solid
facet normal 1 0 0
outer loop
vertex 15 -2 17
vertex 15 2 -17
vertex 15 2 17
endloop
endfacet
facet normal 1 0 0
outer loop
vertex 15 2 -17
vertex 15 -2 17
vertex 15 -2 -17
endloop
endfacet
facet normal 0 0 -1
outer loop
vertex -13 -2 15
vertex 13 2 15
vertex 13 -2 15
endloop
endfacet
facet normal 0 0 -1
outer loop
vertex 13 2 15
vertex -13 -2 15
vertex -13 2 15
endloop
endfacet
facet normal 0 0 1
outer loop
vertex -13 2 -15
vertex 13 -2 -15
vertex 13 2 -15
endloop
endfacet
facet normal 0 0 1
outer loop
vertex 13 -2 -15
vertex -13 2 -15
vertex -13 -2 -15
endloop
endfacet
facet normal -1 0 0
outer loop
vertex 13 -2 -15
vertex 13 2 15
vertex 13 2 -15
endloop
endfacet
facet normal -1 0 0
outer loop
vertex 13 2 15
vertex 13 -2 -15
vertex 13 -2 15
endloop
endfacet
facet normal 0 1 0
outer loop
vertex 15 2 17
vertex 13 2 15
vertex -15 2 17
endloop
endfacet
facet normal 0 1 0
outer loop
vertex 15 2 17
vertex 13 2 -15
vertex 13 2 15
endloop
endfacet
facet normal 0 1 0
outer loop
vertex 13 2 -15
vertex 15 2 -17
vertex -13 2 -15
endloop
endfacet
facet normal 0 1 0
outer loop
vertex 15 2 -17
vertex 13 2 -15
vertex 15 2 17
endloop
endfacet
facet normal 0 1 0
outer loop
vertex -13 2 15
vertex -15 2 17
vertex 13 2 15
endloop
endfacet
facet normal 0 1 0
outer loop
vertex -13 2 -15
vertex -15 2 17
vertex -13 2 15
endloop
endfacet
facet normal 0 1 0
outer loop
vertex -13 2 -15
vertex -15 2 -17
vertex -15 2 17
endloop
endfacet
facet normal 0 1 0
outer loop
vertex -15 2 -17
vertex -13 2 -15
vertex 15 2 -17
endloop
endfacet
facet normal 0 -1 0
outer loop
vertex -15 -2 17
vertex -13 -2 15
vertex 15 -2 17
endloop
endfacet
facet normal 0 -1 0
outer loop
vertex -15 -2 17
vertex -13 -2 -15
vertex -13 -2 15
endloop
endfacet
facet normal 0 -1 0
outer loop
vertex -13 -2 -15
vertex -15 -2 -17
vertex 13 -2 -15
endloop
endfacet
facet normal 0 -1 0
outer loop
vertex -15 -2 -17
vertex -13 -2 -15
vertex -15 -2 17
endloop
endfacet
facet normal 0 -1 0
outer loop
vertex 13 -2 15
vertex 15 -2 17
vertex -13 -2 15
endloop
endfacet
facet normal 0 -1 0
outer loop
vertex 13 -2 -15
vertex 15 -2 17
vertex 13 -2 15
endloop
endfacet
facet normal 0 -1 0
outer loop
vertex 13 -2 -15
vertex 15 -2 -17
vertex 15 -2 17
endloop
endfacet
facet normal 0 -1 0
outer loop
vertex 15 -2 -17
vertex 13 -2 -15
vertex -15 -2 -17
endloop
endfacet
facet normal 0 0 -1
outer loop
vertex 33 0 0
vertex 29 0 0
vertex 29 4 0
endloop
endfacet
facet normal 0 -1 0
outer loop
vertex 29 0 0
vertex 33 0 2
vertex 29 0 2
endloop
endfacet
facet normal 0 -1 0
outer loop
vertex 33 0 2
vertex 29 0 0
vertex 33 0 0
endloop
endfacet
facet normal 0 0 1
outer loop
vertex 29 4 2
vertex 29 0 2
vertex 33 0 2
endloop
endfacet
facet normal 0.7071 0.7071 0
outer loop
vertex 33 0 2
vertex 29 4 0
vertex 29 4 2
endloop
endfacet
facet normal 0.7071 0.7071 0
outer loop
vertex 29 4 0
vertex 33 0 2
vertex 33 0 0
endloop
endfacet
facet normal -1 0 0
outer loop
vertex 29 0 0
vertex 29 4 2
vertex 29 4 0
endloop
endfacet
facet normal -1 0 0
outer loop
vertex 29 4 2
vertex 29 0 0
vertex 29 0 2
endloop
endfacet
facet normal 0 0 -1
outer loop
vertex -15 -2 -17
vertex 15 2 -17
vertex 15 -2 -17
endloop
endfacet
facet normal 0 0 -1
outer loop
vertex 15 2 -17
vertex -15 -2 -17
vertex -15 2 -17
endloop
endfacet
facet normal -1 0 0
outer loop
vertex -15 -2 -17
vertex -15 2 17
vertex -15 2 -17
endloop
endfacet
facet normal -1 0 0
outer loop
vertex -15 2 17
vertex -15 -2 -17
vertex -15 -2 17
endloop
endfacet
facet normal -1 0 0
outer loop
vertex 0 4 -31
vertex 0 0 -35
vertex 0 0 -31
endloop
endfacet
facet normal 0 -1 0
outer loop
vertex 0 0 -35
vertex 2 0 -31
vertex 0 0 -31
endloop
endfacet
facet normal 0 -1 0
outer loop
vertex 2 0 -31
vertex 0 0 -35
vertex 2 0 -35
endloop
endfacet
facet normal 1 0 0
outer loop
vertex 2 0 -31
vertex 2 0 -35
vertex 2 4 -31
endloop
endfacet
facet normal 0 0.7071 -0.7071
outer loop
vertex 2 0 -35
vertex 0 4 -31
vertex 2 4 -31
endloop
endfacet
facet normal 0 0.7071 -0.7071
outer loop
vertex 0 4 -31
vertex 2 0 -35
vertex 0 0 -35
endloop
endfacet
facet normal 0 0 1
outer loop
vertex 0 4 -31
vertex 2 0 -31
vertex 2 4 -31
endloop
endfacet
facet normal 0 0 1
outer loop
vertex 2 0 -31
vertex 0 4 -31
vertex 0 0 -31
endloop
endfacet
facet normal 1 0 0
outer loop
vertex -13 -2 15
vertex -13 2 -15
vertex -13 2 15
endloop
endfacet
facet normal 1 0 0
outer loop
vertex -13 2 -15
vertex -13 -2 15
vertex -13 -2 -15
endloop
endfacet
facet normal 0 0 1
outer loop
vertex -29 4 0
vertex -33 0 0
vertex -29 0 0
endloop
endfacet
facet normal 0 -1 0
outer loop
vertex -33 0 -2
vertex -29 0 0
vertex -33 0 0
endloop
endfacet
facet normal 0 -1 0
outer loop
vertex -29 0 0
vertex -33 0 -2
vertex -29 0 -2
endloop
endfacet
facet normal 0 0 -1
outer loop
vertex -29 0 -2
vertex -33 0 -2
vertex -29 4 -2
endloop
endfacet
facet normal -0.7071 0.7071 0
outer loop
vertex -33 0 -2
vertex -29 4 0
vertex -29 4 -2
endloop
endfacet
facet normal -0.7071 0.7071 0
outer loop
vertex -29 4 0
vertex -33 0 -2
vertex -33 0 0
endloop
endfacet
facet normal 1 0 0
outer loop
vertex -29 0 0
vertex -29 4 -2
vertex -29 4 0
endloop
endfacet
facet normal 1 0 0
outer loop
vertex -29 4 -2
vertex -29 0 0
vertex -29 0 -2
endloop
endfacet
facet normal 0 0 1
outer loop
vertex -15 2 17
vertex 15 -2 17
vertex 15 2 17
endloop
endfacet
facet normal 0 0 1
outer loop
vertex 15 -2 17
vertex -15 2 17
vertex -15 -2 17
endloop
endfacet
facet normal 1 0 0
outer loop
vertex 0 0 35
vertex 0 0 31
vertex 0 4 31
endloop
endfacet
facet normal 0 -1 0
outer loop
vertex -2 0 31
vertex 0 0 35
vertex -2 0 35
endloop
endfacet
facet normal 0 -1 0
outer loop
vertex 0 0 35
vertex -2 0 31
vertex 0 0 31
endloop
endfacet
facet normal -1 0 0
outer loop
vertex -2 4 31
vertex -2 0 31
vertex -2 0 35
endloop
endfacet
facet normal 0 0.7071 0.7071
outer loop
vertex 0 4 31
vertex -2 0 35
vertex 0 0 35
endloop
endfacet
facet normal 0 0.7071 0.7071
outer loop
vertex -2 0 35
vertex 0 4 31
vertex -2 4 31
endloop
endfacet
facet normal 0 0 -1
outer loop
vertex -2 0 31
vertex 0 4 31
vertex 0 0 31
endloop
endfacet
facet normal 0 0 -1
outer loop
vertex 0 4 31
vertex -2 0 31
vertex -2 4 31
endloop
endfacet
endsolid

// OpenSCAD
//$fn= 30;
//translate([5,0,0]) sphere(r=10);
//
//difference(){
//cube([5,5,1]);
//translate([2.5,2.5,.0]) cylinder(r=1,h=1);
//}

//cube([2,4,30], center = true);

//module board( size, label = false ) {
//    // size[0] is always with the grain.
//    // size[1] is against the grain.
//    // size[2] is the board thickness.
//    
//    cube( size = size );
//    
//    // Output the size of the board for easy cut lists.
//    echo( str( size[2], " ", label, ": ", size[0], "x", size[1], " ", (size[0] * size[1] * size[2] / 144), " board feet" ) );
//}
//
//board([10, 4, 2]);

/**
 * Standard right-angled triangle
 *
 * @param number o_len Lenght of the opposite side
 * @param number a_len Lenght of the adjacent side
 * @param number depth How wide/deep the triangle is in the 3rd dimension
 * @todo a better way ?
 */
module triangle(o_len, a_len, depth)
{
    linear_extrude(height=depth)
    {
        polygon(points=[[0,0],[a_len,0],[0,o_len]], paths=[[0,1,2]]);
    }
}

/**
 * Standard right-angled triangle (tangent version)
 *
 * @param number angle of adjacent to hypotenuse (ie tangent)
 * @param number a_len Lenght of the adjacent side
 * @param number depth How wide/deep the triangle is in the 3rd dimension
 */
module a_triangle(tan_angle, a_len, depth)
{
    linear_extrude(height=depth)
    {
        polygon(points=[[0,0],[a_len,0],[0,tan(tan_angle) * a_len]], paths=[[0,1,2]]);
    }
}

module miter_board(size) {
    //difference() {
        cube(size, center = true);
        translate([size[2]/2, 0, 0]) a_triangle(45,size[1],size[0]);
    //}
}

module board(size) {
    cube(size, center = true);
}

length = 30;
width = 2;
for (a=[0:1:3]) {
    if (a % 2 == 0) {
        rotate([0,a*90,0]) translate([length/2-width/2,0,0]) miter_board([width,4,length]);
        echo (a);
    } else {
        rotate([0,a*90,0]) translate([length/2+width/2,0,0]) miter_board([width,4,length], center = true);
    }
}

//// top
//length = 80;
//width = 2;
//for (a = [0:1:8]) {
//    translate([a*width,0,0]) cube([2,width,length]);
//}

// legs:
//length
